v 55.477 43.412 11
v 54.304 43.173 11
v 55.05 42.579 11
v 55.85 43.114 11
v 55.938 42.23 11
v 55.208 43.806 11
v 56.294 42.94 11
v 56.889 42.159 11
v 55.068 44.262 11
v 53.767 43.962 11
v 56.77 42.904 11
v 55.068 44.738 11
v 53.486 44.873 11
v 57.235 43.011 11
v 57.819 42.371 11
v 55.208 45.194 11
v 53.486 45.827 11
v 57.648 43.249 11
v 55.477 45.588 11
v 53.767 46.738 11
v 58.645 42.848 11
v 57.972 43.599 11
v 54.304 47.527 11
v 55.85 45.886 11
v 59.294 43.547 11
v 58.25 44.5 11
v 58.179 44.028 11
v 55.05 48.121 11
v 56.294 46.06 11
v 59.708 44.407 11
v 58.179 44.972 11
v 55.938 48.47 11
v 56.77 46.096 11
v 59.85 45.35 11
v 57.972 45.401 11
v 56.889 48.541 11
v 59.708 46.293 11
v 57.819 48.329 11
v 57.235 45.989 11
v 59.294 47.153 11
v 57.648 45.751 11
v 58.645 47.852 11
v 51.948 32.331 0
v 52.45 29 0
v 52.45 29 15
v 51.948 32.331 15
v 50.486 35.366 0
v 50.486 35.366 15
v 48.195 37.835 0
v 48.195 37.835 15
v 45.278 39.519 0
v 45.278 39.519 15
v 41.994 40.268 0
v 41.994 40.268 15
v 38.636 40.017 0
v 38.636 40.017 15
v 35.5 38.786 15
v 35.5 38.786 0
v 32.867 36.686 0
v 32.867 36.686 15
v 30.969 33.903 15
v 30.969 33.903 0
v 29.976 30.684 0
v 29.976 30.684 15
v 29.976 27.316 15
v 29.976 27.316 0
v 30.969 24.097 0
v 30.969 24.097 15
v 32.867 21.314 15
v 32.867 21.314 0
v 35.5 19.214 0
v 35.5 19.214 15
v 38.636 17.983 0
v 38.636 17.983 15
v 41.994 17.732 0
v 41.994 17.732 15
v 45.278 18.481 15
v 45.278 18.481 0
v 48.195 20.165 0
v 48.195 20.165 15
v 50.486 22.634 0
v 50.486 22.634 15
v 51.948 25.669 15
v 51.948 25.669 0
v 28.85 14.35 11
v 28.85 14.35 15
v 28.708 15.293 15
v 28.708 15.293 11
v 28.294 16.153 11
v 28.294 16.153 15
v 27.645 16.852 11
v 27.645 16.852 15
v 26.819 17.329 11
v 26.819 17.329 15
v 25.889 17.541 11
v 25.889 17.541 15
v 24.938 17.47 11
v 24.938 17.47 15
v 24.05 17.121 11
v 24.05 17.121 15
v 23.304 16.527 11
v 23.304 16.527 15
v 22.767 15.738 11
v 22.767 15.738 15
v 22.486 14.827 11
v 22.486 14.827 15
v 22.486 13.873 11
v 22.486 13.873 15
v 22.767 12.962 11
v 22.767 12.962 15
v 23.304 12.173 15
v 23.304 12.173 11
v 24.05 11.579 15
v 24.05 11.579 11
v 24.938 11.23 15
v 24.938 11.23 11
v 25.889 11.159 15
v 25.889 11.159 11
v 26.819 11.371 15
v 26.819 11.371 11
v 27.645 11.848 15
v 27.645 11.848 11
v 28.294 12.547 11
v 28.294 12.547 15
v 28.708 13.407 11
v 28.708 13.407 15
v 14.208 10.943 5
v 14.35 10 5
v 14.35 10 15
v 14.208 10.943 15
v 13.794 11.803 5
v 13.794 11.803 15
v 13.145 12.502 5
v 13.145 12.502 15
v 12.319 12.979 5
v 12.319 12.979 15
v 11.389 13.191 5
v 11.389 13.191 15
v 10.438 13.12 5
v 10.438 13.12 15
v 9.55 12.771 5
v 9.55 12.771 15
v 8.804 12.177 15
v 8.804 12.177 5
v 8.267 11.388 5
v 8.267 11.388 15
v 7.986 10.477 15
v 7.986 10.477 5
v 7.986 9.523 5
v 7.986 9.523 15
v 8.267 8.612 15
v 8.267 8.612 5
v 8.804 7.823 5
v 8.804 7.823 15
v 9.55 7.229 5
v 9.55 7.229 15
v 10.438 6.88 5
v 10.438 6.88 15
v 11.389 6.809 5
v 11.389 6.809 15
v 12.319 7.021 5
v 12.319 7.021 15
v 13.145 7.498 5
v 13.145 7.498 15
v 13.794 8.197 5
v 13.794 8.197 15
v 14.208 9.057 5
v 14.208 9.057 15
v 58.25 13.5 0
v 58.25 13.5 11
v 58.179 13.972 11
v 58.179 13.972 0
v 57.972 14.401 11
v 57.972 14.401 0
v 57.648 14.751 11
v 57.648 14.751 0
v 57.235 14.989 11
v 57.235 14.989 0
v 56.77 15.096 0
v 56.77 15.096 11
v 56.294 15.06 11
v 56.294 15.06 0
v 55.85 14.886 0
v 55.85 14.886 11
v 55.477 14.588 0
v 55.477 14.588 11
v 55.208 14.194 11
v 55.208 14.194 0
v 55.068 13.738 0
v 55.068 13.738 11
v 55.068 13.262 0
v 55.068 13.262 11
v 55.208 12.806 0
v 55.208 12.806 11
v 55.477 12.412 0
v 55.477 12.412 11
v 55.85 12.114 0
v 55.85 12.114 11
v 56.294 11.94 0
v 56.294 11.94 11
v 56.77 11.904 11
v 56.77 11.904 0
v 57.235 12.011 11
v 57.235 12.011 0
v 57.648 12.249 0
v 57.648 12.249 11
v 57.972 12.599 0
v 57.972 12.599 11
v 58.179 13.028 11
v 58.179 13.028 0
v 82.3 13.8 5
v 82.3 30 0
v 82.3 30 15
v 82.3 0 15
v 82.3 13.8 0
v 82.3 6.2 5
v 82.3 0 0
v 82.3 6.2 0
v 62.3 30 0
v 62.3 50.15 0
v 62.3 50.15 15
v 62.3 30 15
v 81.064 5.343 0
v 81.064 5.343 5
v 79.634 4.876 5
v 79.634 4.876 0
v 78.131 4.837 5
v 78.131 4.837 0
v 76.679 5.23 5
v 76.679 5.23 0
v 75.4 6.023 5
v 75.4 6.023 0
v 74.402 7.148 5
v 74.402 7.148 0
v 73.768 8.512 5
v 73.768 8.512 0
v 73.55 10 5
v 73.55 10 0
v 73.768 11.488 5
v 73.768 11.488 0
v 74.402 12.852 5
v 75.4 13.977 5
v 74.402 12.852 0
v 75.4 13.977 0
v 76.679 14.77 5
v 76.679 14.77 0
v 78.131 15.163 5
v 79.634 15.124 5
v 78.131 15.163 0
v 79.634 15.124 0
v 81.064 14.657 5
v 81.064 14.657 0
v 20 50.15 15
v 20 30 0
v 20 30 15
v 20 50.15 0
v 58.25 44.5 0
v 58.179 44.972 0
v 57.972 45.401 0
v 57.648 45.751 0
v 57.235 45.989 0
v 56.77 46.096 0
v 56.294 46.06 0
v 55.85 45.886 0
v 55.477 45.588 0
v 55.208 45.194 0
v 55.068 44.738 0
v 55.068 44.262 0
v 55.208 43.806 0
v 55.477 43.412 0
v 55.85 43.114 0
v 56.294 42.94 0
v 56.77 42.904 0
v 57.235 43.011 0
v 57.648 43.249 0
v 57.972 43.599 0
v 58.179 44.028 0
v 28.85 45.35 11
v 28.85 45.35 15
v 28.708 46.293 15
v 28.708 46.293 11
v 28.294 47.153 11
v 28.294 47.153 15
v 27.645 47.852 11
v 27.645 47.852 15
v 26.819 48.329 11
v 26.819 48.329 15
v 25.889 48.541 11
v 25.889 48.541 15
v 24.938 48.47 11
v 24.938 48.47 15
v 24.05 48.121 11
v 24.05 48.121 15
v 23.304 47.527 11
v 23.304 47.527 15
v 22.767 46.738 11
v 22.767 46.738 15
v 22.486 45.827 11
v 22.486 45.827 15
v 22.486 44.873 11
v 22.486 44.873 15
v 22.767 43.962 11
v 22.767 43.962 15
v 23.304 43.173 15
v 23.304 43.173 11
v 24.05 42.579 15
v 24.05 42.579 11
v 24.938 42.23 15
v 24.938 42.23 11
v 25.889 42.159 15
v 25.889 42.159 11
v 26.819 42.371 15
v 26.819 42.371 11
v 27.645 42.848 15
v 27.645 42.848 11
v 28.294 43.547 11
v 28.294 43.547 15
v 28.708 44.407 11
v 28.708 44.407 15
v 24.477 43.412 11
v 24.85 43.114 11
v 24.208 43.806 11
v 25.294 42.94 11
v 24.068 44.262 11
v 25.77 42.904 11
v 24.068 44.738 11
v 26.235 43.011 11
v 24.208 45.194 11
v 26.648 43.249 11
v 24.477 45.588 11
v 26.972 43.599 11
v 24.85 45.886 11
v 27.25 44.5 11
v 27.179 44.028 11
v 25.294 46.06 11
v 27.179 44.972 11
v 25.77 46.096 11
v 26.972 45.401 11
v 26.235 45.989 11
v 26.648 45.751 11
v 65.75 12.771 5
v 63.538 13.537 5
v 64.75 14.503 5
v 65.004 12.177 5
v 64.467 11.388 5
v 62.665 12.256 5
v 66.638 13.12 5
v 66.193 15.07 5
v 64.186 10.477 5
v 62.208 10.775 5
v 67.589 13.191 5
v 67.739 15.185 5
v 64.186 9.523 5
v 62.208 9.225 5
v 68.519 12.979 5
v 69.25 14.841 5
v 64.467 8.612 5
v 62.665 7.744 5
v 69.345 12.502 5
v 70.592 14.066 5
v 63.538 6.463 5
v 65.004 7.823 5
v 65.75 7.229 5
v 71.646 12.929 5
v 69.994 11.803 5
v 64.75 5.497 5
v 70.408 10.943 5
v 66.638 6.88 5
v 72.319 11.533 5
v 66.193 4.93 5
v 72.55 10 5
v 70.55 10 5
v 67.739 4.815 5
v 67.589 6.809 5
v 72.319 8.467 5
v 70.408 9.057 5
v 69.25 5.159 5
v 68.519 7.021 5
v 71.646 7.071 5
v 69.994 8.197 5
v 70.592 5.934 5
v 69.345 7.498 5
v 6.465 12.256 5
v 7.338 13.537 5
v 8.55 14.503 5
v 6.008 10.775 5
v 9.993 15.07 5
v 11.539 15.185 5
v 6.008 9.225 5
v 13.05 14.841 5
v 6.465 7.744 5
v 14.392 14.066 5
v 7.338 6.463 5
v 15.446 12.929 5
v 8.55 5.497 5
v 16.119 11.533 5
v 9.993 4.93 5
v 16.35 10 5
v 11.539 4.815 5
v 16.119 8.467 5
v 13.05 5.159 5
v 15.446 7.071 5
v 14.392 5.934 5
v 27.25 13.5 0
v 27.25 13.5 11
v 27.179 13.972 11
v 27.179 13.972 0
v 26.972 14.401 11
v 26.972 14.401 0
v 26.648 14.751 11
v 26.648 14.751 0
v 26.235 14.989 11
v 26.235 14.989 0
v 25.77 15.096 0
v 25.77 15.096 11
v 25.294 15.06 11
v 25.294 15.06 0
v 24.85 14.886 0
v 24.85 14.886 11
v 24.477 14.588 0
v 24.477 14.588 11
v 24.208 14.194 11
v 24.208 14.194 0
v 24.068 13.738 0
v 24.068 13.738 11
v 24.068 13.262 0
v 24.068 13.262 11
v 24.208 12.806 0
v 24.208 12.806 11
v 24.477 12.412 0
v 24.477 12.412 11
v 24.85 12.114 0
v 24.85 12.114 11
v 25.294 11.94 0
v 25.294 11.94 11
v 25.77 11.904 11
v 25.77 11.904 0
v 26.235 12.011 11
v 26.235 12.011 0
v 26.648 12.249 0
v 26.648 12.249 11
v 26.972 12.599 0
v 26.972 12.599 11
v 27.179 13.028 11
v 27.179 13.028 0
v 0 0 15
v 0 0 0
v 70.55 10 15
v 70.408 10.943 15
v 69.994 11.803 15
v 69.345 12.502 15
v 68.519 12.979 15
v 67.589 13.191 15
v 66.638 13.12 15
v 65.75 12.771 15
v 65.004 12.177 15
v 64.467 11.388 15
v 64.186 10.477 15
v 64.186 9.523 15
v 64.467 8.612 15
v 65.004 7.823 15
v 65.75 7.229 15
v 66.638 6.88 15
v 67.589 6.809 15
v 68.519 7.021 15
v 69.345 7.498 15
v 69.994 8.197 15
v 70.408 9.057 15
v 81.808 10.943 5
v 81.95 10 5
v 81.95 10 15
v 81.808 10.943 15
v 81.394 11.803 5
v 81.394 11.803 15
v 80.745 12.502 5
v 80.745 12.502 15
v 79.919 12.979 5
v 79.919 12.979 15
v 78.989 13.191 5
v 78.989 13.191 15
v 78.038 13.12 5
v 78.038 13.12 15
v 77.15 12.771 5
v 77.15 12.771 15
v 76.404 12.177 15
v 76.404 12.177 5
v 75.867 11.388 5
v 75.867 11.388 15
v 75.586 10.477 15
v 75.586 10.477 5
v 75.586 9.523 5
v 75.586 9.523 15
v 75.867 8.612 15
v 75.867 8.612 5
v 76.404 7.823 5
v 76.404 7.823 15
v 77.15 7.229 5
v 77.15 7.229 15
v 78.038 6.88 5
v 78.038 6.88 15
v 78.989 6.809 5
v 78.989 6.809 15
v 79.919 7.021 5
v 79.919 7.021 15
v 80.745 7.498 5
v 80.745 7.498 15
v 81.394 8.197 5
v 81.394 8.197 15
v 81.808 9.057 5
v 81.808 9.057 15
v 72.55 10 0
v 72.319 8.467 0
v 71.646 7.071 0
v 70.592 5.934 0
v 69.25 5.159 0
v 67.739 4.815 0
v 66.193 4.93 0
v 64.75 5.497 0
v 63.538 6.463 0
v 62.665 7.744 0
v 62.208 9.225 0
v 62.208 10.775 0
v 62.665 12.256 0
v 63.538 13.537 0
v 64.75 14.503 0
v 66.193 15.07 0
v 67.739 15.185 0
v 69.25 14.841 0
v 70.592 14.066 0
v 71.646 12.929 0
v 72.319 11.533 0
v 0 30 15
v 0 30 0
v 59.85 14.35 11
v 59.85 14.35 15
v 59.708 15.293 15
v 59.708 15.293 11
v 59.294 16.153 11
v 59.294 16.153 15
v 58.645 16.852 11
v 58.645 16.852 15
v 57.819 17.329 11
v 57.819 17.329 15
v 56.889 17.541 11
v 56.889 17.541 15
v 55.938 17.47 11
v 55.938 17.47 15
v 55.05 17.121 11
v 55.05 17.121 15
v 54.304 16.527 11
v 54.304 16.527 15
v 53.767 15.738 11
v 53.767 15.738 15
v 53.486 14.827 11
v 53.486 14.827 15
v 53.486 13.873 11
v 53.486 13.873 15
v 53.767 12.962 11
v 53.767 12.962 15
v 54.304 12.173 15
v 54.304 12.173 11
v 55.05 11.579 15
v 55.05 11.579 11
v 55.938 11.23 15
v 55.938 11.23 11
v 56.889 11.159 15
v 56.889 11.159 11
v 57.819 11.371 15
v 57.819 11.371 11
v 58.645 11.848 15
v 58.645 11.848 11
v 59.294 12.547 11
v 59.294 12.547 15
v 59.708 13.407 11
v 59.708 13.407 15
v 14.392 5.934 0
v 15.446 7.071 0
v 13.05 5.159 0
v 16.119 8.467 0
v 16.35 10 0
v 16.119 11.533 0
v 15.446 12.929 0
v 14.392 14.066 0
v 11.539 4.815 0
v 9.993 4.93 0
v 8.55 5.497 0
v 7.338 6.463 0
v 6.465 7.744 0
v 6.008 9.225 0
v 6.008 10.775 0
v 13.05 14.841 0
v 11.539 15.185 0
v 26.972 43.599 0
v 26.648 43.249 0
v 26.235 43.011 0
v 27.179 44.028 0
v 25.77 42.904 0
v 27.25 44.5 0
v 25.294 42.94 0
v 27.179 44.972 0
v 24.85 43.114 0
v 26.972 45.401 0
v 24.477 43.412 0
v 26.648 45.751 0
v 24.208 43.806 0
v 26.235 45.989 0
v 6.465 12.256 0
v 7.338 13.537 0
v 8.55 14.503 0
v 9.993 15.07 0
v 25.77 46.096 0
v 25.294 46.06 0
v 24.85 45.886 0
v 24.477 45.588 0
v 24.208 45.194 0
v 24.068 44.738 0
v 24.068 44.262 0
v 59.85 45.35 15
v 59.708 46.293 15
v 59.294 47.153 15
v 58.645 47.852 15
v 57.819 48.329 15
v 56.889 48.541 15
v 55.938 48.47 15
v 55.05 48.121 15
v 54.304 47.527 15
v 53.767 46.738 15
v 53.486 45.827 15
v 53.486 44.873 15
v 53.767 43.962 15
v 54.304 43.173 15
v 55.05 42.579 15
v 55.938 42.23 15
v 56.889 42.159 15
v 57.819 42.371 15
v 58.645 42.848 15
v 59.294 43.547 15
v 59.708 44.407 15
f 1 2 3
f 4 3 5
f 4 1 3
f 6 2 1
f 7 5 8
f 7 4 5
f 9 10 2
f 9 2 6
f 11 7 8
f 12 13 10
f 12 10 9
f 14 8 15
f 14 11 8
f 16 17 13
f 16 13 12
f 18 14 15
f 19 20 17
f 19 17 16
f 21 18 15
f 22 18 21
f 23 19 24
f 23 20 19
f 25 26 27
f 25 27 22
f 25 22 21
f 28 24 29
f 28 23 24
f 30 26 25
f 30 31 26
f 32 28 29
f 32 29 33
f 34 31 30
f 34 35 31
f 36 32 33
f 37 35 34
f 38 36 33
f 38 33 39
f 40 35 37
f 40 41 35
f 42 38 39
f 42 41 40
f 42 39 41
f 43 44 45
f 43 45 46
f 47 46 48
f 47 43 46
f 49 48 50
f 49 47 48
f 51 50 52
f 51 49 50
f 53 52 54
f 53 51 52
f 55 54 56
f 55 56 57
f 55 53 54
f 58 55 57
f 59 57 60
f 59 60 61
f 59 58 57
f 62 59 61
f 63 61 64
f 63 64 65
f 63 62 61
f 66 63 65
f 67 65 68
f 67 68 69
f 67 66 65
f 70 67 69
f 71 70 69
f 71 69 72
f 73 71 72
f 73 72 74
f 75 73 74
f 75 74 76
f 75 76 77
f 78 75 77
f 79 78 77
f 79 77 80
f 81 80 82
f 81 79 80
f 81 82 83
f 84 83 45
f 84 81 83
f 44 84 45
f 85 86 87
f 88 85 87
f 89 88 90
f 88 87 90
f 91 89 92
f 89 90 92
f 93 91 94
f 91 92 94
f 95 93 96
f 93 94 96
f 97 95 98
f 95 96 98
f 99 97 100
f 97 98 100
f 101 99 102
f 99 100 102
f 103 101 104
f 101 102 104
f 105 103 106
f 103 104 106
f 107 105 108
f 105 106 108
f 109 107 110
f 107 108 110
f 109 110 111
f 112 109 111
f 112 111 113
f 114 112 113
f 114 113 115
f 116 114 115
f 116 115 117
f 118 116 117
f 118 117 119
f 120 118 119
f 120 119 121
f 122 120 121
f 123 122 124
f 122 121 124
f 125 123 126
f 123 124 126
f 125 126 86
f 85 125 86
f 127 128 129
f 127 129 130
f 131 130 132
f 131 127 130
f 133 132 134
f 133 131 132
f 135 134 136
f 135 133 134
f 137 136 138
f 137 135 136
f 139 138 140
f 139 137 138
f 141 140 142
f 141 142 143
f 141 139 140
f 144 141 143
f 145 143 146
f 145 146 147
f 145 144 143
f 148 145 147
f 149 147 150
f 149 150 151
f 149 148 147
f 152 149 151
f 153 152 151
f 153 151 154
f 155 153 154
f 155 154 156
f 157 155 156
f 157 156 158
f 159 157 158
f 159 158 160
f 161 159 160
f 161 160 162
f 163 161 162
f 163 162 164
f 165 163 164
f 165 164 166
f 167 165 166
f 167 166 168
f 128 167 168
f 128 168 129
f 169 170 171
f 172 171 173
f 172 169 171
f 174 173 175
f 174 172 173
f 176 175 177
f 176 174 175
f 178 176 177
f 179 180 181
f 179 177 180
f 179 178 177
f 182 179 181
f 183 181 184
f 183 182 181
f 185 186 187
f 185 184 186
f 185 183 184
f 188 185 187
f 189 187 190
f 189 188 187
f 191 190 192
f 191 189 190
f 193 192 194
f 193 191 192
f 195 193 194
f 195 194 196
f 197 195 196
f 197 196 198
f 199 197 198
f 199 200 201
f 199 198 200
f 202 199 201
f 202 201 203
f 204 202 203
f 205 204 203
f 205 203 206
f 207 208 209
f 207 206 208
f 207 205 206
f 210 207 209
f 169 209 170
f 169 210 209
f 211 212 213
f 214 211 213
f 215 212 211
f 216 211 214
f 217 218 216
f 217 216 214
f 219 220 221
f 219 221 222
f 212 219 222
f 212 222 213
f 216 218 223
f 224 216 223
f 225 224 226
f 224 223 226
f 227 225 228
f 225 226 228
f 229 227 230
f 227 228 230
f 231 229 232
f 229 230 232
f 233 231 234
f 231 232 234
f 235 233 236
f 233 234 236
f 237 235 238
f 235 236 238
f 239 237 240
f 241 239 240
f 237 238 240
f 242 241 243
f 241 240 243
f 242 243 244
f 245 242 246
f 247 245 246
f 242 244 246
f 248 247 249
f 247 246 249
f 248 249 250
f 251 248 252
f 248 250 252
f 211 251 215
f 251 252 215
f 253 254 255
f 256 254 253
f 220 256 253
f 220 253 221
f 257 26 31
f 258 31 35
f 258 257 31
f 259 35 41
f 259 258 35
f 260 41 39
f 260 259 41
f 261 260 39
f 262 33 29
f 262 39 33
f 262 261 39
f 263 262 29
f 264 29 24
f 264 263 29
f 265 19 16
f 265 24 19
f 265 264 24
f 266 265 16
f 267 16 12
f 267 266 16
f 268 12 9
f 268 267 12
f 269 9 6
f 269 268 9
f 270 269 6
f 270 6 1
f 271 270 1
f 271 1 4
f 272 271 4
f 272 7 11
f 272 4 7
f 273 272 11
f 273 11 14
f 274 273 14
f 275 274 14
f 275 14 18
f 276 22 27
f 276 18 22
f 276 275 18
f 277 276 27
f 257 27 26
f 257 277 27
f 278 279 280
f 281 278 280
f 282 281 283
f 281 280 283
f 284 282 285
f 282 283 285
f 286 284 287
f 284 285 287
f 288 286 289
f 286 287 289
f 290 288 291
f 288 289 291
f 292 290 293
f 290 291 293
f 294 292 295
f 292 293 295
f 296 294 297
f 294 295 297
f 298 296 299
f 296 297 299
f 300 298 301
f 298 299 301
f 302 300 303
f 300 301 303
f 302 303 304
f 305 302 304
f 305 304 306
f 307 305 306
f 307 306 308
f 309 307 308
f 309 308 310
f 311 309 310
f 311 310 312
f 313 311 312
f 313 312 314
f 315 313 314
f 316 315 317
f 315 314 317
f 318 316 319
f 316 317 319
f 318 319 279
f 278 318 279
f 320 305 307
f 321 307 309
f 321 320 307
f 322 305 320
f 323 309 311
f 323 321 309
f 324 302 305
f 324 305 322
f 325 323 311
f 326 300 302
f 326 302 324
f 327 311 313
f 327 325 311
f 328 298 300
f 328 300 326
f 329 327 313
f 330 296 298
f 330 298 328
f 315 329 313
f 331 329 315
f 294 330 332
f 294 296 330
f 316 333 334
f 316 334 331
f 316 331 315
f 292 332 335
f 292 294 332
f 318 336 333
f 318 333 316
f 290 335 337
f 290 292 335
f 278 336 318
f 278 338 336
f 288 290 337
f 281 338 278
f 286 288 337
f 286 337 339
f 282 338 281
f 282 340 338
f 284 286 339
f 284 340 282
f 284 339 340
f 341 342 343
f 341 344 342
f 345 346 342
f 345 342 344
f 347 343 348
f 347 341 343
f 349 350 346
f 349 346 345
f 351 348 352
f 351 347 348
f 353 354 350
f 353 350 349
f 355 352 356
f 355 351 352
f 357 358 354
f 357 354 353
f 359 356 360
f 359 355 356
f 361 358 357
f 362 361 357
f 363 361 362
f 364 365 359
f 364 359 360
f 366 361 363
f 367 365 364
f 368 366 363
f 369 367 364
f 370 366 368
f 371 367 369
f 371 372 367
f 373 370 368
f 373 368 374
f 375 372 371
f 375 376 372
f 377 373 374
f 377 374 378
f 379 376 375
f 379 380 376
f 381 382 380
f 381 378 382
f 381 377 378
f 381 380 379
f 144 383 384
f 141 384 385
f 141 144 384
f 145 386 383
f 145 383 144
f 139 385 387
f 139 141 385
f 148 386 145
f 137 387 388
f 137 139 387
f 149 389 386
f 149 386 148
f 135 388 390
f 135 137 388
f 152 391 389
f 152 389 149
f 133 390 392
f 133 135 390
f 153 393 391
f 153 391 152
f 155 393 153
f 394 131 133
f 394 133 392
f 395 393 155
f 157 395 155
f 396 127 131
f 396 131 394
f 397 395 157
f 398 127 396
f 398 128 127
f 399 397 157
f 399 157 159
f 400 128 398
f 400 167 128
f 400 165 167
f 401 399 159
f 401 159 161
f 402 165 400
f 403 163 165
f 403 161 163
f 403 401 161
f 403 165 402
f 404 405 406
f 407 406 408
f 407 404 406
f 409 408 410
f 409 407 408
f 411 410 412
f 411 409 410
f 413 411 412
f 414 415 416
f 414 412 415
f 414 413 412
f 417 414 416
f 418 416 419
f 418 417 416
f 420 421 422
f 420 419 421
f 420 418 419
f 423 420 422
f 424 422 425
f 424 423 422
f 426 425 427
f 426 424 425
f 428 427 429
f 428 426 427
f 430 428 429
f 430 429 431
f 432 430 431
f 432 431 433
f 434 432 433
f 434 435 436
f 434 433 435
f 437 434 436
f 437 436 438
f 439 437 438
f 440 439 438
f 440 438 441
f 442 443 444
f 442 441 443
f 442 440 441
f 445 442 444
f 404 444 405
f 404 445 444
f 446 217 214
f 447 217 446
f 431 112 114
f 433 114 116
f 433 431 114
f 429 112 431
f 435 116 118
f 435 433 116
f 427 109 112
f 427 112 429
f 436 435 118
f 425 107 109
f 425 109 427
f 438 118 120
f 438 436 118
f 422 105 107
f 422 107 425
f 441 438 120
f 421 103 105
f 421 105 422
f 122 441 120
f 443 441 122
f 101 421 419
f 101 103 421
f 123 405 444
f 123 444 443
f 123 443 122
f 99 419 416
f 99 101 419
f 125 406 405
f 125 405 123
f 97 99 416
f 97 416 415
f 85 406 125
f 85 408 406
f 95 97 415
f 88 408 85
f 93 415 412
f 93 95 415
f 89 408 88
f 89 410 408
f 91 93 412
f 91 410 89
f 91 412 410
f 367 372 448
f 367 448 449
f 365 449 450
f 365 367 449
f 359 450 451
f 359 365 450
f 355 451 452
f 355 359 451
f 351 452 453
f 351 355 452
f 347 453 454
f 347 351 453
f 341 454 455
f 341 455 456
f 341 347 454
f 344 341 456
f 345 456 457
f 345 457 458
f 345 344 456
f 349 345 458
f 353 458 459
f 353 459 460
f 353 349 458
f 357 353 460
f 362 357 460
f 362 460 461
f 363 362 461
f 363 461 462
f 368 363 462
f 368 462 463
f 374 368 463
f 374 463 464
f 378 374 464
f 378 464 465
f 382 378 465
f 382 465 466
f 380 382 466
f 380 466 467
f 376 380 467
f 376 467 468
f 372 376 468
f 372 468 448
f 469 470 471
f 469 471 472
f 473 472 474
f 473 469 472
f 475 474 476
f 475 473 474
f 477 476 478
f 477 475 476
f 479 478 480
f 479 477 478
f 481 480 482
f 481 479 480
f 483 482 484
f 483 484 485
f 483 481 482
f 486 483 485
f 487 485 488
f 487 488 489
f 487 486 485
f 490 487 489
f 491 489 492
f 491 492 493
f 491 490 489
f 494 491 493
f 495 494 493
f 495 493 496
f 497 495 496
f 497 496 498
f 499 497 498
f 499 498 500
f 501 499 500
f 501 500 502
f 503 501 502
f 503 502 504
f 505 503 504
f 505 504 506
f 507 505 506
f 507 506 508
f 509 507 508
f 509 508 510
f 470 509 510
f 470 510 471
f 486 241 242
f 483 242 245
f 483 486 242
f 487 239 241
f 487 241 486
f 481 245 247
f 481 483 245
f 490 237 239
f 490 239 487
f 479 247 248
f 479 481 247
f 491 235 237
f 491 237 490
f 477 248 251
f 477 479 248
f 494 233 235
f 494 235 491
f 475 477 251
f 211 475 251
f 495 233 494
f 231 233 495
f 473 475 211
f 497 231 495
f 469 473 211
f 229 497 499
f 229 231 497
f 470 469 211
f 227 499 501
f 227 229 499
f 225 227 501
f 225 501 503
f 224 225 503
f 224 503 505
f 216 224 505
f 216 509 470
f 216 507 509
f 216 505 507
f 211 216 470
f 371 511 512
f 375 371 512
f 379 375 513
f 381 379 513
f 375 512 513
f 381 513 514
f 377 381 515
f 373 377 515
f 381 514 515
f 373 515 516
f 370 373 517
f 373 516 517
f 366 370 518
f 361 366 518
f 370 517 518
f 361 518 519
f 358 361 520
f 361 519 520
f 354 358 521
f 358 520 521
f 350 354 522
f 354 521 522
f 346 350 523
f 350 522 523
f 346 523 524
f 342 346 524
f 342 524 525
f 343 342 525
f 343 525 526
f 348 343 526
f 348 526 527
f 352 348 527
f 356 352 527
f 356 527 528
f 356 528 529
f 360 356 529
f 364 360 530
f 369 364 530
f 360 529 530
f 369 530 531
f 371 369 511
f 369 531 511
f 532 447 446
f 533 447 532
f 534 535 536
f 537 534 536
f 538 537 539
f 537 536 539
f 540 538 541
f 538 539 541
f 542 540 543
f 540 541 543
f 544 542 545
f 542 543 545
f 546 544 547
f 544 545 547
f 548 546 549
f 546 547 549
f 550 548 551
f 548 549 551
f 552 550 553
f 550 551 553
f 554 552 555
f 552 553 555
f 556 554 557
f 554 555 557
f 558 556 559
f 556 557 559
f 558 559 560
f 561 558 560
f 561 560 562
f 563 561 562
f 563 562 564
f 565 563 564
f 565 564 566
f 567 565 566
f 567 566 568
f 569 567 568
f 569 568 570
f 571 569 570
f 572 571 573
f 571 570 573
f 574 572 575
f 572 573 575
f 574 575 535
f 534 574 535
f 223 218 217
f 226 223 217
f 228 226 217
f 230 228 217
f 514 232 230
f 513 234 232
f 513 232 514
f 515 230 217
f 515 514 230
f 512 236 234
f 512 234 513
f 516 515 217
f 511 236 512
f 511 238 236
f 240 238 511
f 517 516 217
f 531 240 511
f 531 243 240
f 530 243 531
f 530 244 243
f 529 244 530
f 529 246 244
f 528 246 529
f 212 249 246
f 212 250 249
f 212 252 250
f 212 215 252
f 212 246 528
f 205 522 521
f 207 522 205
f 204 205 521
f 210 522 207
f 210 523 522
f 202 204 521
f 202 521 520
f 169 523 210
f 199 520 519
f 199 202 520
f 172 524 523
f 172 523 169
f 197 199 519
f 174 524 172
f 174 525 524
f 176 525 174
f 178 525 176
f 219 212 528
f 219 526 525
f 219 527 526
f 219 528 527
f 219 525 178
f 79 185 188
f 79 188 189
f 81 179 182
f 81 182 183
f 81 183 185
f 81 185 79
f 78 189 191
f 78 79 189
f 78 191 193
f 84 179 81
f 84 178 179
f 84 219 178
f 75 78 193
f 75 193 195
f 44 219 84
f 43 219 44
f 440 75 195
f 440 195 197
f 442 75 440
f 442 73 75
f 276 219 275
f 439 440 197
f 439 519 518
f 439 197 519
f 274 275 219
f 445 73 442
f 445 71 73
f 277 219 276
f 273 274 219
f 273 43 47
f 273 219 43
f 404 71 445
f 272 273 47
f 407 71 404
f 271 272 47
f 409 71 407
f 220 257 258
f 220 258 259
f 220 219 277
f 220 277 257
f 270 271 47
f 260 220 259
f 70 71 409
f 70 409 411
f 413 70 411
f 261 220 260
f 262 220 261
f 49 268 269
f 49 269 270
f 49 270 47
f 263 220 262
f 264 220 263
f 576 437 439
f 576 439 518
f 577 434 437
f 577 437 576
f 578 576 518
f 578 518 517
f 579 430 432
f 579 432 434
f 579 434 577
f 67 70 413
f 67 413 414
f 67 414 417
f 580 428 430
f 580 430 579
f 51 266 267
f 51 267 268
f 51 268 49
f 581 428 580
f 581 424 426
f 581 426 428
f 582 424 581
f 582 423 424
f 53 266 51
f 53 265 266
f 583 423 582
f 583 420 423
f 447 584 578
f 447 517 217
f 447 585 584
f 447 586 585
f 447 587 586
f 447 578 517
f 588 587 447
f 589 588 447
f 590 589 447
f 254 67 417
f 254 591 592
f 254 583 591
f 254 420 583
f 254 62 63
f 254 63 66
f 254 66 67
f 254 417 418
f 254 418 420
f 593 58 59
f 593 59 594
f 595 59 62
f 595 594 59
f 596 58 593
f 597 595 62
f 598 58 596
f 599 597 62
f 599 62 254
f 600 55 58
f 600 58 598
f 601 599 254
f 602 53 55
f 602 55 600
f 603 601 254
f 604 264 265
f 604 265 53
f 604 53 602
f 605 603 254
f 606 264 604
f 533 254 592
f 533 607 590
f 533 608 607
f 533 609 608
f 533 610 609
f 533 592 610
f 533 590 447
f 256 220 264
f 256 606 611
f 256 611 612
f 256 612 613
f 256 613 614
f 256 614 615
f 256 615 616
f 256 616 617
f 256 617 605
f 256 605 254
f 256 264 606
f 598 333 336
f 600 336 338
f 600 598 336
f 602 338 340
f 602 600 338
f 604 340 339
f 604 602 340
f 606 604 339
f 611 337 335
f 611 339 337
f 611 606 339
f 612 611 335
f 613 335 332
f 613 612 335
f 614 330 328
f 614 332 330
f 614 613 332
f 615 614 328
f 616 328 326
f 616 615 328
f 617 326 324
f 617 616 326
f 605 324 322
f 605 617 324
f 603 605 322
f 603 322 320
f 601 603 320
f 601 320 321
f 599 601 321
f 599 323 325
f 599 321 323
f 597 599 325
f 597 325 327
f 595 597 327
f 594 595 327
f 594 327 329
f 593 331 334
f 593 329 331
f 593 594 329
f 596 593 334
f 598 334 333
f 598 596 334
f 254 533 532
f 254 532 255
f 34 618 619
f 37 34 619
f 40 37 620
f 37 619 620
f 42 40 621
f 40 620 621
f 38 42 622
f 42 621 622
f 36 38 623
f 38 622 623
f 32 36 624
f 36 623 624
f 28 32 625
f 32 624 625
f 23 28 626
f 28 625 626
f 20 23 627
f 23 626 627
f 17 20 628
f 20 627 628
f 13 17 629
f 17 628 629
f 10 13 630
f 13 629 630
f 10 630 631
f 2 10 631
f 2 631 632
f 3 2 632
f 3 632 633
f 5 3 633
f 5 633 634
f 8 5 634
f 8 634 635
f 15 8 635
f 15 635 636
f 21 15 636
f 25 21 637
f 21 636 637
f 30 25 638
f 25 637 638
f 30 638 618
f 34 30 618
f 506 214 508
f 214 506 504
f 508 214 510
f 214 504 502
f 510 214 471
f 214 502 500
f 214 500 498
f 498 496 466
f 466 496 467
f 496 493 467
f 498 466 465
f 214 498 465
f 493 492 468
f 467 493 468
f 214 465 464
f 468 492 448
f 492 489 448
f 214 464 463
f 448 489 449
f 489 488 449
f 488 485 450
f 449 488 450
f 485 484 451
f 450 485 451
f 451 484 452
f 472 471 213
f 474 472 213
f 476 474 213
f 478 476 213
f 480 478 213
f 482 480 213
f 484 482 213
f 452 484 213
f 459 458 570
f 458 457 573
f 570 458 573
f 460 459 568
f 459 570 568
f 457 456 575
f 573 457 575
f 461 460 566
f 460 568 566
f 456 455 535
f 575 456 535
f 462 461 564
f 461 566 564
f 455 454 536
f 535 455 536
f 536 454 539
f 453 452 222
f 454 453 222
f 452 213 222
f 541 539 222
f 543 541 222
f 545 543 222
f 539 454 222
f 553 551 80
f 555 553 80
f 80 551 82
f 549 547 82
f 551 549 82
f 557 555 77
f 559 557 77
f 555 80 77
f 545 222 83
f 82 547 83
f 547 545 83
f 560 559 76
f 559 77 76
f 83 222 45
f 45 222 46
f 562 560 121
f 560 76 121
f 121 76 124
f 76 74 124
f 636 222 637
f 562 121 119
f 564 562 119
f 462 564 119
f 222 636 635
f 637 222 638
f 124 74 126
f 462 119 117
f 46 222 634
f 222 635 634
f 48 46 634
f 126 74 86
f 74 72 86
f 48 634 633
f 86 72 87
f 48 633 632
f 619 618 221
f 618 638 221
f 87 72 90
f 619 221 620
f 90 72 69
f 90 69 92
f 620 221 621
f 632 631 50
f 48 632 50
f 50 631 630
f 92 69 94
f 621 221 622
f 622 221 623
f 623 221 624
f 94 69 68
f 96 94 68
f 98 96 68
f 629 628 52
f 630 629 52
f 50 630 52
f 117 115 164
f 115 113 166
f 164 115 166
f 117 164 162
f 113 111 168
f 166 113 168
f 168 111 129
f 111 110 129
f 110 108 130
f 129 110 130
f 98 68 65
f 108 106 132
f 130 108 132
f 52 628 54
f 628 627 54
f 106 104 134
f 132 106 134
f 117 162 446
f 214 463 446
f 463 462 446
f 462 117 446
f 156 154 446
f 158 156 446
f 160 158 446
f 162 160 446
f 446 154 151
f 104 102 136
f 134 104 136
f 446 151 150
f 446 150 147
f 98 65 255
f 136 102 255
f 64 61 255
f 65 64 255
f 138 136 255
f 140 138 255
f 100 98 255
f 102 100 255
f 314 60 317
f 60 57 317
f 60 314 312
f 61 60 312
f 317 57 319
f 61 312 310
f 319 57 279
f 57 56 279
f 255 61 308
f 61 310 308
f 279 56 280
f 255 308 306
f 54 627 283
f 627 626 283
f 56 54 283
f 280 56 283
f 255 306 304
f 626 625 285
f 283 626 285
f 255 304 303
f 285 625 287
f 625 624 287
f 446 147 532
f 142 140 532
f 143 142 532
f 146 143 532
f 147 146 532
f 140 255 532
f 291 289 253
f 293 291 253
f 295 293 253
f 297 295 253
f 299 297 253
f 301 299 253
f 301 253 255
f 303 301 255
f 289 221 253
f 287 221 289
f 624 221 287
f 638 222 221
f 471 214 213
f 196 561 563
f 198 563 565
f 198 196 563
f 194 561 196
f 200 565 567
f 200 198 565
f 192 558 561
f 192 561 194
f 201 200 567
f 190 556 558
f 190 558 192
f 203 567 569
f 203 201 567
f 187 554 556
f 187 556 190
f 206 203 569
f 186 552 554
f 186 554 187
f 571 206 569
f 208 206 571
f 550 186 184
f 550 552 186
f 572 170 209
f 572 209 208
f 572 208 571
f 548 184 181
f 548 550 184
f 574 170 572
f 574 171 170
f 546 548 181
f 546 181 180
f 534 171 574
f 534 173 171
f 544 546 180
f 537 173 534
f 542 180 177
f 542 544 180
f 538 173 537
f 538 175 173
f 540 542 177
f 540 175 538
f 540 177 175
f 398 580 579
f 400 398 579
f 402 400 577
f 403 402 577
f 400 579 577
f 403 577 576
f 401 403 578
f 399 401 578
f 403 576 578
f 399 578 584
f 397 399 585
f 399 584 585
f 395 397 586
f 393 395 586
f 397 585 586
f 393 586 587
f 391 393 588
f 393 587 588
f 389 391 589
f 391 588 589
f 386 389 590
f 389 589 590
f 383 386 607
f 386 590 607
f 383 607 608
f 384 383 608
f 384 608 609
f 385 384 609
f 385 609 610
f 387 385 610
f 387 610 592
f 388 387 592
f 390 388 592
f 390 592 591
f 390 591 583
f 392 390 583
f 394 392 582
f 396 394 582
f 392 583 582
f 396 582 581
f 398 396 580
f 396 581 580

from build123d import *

# Parameters (mm, degrees)
SKETCH_R        = 11.3
SKETCH_R_2      = 1.6
SKETCH_R_3      = 3.2
PAD_DEPTH       = 15
SKETCH001_R     = 3.2
POCKET_DEPTH    = 4
SKETCH002_R     = 5.2
POCKET001_DEPTH = 5


with BuildPart() as part:
    # Sketch → Pad (new body)
    with BuildSketch(Plane.XY):
        Polygon((20, 30), (20, 50.15), (62.3, 50.15), (62.3, 30), (82.3, 30), (82.3, 0), (0, 0), (0, 30), align=None)
        with Locations((41.15, 29)):
            Circle(SKETCH_R, mode=Mode.SUBTRACT)
        with Locations((25.65, 44.5)):
            Circle(SKETCH_R_2, mode=Mode.SUBTRACT)
        with Locations((25.65, 13.5)):
            Circle(SKETCH_R_2, mode=Mode.SUBTRACT)
        with Locations((56.65, 44.5)):
            Circle(SKETCH_R_2, mode=Mode.SUBTRACT)
        with Locations((56.65, 13.5)):
            Circle(SKETCH_R_2, mode=Mode.SUBTRACT)
        with Locations((11.15, 10)):
            Circle(SKETCH_R_3, mode=Mode.SUBTRACT)
        with Locations((67.35, 10)):
            Circle(SKETCH_R_3, mode=Mode.SUBTRACT)
        with Locations((78.75, 10)):
            Circle(SKETCH_R_3, mode=Mode.SUBTRACT)
    extrude(amount=PAD_DEPTH)

    # Sketch001 (on Face18 of Pad) → Pocket (cut)
    with BuildSketch(Plane.XY.offset(15)):
        with Locations((25.65, 45.35)):
            Circle(SKETCH001_R)
        with Locations((56.65, 45.35)):
            Circle(SKETCH001_R)
        with Locations((56.65, 14.35)):
            Circle(SKETCH001_R)
        with Locations((25.65, 14.35)):
            Circle(SKETCH001_R)
    extrude(amount=-POCKET_DEPTH, mode=Mode.SUBTRACT)

    # Sketch002 (on Face4 of Pocket) → Pocket001 (cut)
    with BuildSketch(Plane(origin=(0, 0, 0), x_dir=(1, 0, 0), z_dir=(0, 0, -1))):
        with Locations((11.15, -10)):
            Circle(SKETCH002_R)
        with Locations((67.35, -10)):
            Circle(SKETCH002_R)
        with Locations((78.75, -10)):
            Circle(SKETCH002_R)
    extrude(amount=-POCKET001_DEPTH, mode=Mode.SUBTRACT)


solid = part.part
